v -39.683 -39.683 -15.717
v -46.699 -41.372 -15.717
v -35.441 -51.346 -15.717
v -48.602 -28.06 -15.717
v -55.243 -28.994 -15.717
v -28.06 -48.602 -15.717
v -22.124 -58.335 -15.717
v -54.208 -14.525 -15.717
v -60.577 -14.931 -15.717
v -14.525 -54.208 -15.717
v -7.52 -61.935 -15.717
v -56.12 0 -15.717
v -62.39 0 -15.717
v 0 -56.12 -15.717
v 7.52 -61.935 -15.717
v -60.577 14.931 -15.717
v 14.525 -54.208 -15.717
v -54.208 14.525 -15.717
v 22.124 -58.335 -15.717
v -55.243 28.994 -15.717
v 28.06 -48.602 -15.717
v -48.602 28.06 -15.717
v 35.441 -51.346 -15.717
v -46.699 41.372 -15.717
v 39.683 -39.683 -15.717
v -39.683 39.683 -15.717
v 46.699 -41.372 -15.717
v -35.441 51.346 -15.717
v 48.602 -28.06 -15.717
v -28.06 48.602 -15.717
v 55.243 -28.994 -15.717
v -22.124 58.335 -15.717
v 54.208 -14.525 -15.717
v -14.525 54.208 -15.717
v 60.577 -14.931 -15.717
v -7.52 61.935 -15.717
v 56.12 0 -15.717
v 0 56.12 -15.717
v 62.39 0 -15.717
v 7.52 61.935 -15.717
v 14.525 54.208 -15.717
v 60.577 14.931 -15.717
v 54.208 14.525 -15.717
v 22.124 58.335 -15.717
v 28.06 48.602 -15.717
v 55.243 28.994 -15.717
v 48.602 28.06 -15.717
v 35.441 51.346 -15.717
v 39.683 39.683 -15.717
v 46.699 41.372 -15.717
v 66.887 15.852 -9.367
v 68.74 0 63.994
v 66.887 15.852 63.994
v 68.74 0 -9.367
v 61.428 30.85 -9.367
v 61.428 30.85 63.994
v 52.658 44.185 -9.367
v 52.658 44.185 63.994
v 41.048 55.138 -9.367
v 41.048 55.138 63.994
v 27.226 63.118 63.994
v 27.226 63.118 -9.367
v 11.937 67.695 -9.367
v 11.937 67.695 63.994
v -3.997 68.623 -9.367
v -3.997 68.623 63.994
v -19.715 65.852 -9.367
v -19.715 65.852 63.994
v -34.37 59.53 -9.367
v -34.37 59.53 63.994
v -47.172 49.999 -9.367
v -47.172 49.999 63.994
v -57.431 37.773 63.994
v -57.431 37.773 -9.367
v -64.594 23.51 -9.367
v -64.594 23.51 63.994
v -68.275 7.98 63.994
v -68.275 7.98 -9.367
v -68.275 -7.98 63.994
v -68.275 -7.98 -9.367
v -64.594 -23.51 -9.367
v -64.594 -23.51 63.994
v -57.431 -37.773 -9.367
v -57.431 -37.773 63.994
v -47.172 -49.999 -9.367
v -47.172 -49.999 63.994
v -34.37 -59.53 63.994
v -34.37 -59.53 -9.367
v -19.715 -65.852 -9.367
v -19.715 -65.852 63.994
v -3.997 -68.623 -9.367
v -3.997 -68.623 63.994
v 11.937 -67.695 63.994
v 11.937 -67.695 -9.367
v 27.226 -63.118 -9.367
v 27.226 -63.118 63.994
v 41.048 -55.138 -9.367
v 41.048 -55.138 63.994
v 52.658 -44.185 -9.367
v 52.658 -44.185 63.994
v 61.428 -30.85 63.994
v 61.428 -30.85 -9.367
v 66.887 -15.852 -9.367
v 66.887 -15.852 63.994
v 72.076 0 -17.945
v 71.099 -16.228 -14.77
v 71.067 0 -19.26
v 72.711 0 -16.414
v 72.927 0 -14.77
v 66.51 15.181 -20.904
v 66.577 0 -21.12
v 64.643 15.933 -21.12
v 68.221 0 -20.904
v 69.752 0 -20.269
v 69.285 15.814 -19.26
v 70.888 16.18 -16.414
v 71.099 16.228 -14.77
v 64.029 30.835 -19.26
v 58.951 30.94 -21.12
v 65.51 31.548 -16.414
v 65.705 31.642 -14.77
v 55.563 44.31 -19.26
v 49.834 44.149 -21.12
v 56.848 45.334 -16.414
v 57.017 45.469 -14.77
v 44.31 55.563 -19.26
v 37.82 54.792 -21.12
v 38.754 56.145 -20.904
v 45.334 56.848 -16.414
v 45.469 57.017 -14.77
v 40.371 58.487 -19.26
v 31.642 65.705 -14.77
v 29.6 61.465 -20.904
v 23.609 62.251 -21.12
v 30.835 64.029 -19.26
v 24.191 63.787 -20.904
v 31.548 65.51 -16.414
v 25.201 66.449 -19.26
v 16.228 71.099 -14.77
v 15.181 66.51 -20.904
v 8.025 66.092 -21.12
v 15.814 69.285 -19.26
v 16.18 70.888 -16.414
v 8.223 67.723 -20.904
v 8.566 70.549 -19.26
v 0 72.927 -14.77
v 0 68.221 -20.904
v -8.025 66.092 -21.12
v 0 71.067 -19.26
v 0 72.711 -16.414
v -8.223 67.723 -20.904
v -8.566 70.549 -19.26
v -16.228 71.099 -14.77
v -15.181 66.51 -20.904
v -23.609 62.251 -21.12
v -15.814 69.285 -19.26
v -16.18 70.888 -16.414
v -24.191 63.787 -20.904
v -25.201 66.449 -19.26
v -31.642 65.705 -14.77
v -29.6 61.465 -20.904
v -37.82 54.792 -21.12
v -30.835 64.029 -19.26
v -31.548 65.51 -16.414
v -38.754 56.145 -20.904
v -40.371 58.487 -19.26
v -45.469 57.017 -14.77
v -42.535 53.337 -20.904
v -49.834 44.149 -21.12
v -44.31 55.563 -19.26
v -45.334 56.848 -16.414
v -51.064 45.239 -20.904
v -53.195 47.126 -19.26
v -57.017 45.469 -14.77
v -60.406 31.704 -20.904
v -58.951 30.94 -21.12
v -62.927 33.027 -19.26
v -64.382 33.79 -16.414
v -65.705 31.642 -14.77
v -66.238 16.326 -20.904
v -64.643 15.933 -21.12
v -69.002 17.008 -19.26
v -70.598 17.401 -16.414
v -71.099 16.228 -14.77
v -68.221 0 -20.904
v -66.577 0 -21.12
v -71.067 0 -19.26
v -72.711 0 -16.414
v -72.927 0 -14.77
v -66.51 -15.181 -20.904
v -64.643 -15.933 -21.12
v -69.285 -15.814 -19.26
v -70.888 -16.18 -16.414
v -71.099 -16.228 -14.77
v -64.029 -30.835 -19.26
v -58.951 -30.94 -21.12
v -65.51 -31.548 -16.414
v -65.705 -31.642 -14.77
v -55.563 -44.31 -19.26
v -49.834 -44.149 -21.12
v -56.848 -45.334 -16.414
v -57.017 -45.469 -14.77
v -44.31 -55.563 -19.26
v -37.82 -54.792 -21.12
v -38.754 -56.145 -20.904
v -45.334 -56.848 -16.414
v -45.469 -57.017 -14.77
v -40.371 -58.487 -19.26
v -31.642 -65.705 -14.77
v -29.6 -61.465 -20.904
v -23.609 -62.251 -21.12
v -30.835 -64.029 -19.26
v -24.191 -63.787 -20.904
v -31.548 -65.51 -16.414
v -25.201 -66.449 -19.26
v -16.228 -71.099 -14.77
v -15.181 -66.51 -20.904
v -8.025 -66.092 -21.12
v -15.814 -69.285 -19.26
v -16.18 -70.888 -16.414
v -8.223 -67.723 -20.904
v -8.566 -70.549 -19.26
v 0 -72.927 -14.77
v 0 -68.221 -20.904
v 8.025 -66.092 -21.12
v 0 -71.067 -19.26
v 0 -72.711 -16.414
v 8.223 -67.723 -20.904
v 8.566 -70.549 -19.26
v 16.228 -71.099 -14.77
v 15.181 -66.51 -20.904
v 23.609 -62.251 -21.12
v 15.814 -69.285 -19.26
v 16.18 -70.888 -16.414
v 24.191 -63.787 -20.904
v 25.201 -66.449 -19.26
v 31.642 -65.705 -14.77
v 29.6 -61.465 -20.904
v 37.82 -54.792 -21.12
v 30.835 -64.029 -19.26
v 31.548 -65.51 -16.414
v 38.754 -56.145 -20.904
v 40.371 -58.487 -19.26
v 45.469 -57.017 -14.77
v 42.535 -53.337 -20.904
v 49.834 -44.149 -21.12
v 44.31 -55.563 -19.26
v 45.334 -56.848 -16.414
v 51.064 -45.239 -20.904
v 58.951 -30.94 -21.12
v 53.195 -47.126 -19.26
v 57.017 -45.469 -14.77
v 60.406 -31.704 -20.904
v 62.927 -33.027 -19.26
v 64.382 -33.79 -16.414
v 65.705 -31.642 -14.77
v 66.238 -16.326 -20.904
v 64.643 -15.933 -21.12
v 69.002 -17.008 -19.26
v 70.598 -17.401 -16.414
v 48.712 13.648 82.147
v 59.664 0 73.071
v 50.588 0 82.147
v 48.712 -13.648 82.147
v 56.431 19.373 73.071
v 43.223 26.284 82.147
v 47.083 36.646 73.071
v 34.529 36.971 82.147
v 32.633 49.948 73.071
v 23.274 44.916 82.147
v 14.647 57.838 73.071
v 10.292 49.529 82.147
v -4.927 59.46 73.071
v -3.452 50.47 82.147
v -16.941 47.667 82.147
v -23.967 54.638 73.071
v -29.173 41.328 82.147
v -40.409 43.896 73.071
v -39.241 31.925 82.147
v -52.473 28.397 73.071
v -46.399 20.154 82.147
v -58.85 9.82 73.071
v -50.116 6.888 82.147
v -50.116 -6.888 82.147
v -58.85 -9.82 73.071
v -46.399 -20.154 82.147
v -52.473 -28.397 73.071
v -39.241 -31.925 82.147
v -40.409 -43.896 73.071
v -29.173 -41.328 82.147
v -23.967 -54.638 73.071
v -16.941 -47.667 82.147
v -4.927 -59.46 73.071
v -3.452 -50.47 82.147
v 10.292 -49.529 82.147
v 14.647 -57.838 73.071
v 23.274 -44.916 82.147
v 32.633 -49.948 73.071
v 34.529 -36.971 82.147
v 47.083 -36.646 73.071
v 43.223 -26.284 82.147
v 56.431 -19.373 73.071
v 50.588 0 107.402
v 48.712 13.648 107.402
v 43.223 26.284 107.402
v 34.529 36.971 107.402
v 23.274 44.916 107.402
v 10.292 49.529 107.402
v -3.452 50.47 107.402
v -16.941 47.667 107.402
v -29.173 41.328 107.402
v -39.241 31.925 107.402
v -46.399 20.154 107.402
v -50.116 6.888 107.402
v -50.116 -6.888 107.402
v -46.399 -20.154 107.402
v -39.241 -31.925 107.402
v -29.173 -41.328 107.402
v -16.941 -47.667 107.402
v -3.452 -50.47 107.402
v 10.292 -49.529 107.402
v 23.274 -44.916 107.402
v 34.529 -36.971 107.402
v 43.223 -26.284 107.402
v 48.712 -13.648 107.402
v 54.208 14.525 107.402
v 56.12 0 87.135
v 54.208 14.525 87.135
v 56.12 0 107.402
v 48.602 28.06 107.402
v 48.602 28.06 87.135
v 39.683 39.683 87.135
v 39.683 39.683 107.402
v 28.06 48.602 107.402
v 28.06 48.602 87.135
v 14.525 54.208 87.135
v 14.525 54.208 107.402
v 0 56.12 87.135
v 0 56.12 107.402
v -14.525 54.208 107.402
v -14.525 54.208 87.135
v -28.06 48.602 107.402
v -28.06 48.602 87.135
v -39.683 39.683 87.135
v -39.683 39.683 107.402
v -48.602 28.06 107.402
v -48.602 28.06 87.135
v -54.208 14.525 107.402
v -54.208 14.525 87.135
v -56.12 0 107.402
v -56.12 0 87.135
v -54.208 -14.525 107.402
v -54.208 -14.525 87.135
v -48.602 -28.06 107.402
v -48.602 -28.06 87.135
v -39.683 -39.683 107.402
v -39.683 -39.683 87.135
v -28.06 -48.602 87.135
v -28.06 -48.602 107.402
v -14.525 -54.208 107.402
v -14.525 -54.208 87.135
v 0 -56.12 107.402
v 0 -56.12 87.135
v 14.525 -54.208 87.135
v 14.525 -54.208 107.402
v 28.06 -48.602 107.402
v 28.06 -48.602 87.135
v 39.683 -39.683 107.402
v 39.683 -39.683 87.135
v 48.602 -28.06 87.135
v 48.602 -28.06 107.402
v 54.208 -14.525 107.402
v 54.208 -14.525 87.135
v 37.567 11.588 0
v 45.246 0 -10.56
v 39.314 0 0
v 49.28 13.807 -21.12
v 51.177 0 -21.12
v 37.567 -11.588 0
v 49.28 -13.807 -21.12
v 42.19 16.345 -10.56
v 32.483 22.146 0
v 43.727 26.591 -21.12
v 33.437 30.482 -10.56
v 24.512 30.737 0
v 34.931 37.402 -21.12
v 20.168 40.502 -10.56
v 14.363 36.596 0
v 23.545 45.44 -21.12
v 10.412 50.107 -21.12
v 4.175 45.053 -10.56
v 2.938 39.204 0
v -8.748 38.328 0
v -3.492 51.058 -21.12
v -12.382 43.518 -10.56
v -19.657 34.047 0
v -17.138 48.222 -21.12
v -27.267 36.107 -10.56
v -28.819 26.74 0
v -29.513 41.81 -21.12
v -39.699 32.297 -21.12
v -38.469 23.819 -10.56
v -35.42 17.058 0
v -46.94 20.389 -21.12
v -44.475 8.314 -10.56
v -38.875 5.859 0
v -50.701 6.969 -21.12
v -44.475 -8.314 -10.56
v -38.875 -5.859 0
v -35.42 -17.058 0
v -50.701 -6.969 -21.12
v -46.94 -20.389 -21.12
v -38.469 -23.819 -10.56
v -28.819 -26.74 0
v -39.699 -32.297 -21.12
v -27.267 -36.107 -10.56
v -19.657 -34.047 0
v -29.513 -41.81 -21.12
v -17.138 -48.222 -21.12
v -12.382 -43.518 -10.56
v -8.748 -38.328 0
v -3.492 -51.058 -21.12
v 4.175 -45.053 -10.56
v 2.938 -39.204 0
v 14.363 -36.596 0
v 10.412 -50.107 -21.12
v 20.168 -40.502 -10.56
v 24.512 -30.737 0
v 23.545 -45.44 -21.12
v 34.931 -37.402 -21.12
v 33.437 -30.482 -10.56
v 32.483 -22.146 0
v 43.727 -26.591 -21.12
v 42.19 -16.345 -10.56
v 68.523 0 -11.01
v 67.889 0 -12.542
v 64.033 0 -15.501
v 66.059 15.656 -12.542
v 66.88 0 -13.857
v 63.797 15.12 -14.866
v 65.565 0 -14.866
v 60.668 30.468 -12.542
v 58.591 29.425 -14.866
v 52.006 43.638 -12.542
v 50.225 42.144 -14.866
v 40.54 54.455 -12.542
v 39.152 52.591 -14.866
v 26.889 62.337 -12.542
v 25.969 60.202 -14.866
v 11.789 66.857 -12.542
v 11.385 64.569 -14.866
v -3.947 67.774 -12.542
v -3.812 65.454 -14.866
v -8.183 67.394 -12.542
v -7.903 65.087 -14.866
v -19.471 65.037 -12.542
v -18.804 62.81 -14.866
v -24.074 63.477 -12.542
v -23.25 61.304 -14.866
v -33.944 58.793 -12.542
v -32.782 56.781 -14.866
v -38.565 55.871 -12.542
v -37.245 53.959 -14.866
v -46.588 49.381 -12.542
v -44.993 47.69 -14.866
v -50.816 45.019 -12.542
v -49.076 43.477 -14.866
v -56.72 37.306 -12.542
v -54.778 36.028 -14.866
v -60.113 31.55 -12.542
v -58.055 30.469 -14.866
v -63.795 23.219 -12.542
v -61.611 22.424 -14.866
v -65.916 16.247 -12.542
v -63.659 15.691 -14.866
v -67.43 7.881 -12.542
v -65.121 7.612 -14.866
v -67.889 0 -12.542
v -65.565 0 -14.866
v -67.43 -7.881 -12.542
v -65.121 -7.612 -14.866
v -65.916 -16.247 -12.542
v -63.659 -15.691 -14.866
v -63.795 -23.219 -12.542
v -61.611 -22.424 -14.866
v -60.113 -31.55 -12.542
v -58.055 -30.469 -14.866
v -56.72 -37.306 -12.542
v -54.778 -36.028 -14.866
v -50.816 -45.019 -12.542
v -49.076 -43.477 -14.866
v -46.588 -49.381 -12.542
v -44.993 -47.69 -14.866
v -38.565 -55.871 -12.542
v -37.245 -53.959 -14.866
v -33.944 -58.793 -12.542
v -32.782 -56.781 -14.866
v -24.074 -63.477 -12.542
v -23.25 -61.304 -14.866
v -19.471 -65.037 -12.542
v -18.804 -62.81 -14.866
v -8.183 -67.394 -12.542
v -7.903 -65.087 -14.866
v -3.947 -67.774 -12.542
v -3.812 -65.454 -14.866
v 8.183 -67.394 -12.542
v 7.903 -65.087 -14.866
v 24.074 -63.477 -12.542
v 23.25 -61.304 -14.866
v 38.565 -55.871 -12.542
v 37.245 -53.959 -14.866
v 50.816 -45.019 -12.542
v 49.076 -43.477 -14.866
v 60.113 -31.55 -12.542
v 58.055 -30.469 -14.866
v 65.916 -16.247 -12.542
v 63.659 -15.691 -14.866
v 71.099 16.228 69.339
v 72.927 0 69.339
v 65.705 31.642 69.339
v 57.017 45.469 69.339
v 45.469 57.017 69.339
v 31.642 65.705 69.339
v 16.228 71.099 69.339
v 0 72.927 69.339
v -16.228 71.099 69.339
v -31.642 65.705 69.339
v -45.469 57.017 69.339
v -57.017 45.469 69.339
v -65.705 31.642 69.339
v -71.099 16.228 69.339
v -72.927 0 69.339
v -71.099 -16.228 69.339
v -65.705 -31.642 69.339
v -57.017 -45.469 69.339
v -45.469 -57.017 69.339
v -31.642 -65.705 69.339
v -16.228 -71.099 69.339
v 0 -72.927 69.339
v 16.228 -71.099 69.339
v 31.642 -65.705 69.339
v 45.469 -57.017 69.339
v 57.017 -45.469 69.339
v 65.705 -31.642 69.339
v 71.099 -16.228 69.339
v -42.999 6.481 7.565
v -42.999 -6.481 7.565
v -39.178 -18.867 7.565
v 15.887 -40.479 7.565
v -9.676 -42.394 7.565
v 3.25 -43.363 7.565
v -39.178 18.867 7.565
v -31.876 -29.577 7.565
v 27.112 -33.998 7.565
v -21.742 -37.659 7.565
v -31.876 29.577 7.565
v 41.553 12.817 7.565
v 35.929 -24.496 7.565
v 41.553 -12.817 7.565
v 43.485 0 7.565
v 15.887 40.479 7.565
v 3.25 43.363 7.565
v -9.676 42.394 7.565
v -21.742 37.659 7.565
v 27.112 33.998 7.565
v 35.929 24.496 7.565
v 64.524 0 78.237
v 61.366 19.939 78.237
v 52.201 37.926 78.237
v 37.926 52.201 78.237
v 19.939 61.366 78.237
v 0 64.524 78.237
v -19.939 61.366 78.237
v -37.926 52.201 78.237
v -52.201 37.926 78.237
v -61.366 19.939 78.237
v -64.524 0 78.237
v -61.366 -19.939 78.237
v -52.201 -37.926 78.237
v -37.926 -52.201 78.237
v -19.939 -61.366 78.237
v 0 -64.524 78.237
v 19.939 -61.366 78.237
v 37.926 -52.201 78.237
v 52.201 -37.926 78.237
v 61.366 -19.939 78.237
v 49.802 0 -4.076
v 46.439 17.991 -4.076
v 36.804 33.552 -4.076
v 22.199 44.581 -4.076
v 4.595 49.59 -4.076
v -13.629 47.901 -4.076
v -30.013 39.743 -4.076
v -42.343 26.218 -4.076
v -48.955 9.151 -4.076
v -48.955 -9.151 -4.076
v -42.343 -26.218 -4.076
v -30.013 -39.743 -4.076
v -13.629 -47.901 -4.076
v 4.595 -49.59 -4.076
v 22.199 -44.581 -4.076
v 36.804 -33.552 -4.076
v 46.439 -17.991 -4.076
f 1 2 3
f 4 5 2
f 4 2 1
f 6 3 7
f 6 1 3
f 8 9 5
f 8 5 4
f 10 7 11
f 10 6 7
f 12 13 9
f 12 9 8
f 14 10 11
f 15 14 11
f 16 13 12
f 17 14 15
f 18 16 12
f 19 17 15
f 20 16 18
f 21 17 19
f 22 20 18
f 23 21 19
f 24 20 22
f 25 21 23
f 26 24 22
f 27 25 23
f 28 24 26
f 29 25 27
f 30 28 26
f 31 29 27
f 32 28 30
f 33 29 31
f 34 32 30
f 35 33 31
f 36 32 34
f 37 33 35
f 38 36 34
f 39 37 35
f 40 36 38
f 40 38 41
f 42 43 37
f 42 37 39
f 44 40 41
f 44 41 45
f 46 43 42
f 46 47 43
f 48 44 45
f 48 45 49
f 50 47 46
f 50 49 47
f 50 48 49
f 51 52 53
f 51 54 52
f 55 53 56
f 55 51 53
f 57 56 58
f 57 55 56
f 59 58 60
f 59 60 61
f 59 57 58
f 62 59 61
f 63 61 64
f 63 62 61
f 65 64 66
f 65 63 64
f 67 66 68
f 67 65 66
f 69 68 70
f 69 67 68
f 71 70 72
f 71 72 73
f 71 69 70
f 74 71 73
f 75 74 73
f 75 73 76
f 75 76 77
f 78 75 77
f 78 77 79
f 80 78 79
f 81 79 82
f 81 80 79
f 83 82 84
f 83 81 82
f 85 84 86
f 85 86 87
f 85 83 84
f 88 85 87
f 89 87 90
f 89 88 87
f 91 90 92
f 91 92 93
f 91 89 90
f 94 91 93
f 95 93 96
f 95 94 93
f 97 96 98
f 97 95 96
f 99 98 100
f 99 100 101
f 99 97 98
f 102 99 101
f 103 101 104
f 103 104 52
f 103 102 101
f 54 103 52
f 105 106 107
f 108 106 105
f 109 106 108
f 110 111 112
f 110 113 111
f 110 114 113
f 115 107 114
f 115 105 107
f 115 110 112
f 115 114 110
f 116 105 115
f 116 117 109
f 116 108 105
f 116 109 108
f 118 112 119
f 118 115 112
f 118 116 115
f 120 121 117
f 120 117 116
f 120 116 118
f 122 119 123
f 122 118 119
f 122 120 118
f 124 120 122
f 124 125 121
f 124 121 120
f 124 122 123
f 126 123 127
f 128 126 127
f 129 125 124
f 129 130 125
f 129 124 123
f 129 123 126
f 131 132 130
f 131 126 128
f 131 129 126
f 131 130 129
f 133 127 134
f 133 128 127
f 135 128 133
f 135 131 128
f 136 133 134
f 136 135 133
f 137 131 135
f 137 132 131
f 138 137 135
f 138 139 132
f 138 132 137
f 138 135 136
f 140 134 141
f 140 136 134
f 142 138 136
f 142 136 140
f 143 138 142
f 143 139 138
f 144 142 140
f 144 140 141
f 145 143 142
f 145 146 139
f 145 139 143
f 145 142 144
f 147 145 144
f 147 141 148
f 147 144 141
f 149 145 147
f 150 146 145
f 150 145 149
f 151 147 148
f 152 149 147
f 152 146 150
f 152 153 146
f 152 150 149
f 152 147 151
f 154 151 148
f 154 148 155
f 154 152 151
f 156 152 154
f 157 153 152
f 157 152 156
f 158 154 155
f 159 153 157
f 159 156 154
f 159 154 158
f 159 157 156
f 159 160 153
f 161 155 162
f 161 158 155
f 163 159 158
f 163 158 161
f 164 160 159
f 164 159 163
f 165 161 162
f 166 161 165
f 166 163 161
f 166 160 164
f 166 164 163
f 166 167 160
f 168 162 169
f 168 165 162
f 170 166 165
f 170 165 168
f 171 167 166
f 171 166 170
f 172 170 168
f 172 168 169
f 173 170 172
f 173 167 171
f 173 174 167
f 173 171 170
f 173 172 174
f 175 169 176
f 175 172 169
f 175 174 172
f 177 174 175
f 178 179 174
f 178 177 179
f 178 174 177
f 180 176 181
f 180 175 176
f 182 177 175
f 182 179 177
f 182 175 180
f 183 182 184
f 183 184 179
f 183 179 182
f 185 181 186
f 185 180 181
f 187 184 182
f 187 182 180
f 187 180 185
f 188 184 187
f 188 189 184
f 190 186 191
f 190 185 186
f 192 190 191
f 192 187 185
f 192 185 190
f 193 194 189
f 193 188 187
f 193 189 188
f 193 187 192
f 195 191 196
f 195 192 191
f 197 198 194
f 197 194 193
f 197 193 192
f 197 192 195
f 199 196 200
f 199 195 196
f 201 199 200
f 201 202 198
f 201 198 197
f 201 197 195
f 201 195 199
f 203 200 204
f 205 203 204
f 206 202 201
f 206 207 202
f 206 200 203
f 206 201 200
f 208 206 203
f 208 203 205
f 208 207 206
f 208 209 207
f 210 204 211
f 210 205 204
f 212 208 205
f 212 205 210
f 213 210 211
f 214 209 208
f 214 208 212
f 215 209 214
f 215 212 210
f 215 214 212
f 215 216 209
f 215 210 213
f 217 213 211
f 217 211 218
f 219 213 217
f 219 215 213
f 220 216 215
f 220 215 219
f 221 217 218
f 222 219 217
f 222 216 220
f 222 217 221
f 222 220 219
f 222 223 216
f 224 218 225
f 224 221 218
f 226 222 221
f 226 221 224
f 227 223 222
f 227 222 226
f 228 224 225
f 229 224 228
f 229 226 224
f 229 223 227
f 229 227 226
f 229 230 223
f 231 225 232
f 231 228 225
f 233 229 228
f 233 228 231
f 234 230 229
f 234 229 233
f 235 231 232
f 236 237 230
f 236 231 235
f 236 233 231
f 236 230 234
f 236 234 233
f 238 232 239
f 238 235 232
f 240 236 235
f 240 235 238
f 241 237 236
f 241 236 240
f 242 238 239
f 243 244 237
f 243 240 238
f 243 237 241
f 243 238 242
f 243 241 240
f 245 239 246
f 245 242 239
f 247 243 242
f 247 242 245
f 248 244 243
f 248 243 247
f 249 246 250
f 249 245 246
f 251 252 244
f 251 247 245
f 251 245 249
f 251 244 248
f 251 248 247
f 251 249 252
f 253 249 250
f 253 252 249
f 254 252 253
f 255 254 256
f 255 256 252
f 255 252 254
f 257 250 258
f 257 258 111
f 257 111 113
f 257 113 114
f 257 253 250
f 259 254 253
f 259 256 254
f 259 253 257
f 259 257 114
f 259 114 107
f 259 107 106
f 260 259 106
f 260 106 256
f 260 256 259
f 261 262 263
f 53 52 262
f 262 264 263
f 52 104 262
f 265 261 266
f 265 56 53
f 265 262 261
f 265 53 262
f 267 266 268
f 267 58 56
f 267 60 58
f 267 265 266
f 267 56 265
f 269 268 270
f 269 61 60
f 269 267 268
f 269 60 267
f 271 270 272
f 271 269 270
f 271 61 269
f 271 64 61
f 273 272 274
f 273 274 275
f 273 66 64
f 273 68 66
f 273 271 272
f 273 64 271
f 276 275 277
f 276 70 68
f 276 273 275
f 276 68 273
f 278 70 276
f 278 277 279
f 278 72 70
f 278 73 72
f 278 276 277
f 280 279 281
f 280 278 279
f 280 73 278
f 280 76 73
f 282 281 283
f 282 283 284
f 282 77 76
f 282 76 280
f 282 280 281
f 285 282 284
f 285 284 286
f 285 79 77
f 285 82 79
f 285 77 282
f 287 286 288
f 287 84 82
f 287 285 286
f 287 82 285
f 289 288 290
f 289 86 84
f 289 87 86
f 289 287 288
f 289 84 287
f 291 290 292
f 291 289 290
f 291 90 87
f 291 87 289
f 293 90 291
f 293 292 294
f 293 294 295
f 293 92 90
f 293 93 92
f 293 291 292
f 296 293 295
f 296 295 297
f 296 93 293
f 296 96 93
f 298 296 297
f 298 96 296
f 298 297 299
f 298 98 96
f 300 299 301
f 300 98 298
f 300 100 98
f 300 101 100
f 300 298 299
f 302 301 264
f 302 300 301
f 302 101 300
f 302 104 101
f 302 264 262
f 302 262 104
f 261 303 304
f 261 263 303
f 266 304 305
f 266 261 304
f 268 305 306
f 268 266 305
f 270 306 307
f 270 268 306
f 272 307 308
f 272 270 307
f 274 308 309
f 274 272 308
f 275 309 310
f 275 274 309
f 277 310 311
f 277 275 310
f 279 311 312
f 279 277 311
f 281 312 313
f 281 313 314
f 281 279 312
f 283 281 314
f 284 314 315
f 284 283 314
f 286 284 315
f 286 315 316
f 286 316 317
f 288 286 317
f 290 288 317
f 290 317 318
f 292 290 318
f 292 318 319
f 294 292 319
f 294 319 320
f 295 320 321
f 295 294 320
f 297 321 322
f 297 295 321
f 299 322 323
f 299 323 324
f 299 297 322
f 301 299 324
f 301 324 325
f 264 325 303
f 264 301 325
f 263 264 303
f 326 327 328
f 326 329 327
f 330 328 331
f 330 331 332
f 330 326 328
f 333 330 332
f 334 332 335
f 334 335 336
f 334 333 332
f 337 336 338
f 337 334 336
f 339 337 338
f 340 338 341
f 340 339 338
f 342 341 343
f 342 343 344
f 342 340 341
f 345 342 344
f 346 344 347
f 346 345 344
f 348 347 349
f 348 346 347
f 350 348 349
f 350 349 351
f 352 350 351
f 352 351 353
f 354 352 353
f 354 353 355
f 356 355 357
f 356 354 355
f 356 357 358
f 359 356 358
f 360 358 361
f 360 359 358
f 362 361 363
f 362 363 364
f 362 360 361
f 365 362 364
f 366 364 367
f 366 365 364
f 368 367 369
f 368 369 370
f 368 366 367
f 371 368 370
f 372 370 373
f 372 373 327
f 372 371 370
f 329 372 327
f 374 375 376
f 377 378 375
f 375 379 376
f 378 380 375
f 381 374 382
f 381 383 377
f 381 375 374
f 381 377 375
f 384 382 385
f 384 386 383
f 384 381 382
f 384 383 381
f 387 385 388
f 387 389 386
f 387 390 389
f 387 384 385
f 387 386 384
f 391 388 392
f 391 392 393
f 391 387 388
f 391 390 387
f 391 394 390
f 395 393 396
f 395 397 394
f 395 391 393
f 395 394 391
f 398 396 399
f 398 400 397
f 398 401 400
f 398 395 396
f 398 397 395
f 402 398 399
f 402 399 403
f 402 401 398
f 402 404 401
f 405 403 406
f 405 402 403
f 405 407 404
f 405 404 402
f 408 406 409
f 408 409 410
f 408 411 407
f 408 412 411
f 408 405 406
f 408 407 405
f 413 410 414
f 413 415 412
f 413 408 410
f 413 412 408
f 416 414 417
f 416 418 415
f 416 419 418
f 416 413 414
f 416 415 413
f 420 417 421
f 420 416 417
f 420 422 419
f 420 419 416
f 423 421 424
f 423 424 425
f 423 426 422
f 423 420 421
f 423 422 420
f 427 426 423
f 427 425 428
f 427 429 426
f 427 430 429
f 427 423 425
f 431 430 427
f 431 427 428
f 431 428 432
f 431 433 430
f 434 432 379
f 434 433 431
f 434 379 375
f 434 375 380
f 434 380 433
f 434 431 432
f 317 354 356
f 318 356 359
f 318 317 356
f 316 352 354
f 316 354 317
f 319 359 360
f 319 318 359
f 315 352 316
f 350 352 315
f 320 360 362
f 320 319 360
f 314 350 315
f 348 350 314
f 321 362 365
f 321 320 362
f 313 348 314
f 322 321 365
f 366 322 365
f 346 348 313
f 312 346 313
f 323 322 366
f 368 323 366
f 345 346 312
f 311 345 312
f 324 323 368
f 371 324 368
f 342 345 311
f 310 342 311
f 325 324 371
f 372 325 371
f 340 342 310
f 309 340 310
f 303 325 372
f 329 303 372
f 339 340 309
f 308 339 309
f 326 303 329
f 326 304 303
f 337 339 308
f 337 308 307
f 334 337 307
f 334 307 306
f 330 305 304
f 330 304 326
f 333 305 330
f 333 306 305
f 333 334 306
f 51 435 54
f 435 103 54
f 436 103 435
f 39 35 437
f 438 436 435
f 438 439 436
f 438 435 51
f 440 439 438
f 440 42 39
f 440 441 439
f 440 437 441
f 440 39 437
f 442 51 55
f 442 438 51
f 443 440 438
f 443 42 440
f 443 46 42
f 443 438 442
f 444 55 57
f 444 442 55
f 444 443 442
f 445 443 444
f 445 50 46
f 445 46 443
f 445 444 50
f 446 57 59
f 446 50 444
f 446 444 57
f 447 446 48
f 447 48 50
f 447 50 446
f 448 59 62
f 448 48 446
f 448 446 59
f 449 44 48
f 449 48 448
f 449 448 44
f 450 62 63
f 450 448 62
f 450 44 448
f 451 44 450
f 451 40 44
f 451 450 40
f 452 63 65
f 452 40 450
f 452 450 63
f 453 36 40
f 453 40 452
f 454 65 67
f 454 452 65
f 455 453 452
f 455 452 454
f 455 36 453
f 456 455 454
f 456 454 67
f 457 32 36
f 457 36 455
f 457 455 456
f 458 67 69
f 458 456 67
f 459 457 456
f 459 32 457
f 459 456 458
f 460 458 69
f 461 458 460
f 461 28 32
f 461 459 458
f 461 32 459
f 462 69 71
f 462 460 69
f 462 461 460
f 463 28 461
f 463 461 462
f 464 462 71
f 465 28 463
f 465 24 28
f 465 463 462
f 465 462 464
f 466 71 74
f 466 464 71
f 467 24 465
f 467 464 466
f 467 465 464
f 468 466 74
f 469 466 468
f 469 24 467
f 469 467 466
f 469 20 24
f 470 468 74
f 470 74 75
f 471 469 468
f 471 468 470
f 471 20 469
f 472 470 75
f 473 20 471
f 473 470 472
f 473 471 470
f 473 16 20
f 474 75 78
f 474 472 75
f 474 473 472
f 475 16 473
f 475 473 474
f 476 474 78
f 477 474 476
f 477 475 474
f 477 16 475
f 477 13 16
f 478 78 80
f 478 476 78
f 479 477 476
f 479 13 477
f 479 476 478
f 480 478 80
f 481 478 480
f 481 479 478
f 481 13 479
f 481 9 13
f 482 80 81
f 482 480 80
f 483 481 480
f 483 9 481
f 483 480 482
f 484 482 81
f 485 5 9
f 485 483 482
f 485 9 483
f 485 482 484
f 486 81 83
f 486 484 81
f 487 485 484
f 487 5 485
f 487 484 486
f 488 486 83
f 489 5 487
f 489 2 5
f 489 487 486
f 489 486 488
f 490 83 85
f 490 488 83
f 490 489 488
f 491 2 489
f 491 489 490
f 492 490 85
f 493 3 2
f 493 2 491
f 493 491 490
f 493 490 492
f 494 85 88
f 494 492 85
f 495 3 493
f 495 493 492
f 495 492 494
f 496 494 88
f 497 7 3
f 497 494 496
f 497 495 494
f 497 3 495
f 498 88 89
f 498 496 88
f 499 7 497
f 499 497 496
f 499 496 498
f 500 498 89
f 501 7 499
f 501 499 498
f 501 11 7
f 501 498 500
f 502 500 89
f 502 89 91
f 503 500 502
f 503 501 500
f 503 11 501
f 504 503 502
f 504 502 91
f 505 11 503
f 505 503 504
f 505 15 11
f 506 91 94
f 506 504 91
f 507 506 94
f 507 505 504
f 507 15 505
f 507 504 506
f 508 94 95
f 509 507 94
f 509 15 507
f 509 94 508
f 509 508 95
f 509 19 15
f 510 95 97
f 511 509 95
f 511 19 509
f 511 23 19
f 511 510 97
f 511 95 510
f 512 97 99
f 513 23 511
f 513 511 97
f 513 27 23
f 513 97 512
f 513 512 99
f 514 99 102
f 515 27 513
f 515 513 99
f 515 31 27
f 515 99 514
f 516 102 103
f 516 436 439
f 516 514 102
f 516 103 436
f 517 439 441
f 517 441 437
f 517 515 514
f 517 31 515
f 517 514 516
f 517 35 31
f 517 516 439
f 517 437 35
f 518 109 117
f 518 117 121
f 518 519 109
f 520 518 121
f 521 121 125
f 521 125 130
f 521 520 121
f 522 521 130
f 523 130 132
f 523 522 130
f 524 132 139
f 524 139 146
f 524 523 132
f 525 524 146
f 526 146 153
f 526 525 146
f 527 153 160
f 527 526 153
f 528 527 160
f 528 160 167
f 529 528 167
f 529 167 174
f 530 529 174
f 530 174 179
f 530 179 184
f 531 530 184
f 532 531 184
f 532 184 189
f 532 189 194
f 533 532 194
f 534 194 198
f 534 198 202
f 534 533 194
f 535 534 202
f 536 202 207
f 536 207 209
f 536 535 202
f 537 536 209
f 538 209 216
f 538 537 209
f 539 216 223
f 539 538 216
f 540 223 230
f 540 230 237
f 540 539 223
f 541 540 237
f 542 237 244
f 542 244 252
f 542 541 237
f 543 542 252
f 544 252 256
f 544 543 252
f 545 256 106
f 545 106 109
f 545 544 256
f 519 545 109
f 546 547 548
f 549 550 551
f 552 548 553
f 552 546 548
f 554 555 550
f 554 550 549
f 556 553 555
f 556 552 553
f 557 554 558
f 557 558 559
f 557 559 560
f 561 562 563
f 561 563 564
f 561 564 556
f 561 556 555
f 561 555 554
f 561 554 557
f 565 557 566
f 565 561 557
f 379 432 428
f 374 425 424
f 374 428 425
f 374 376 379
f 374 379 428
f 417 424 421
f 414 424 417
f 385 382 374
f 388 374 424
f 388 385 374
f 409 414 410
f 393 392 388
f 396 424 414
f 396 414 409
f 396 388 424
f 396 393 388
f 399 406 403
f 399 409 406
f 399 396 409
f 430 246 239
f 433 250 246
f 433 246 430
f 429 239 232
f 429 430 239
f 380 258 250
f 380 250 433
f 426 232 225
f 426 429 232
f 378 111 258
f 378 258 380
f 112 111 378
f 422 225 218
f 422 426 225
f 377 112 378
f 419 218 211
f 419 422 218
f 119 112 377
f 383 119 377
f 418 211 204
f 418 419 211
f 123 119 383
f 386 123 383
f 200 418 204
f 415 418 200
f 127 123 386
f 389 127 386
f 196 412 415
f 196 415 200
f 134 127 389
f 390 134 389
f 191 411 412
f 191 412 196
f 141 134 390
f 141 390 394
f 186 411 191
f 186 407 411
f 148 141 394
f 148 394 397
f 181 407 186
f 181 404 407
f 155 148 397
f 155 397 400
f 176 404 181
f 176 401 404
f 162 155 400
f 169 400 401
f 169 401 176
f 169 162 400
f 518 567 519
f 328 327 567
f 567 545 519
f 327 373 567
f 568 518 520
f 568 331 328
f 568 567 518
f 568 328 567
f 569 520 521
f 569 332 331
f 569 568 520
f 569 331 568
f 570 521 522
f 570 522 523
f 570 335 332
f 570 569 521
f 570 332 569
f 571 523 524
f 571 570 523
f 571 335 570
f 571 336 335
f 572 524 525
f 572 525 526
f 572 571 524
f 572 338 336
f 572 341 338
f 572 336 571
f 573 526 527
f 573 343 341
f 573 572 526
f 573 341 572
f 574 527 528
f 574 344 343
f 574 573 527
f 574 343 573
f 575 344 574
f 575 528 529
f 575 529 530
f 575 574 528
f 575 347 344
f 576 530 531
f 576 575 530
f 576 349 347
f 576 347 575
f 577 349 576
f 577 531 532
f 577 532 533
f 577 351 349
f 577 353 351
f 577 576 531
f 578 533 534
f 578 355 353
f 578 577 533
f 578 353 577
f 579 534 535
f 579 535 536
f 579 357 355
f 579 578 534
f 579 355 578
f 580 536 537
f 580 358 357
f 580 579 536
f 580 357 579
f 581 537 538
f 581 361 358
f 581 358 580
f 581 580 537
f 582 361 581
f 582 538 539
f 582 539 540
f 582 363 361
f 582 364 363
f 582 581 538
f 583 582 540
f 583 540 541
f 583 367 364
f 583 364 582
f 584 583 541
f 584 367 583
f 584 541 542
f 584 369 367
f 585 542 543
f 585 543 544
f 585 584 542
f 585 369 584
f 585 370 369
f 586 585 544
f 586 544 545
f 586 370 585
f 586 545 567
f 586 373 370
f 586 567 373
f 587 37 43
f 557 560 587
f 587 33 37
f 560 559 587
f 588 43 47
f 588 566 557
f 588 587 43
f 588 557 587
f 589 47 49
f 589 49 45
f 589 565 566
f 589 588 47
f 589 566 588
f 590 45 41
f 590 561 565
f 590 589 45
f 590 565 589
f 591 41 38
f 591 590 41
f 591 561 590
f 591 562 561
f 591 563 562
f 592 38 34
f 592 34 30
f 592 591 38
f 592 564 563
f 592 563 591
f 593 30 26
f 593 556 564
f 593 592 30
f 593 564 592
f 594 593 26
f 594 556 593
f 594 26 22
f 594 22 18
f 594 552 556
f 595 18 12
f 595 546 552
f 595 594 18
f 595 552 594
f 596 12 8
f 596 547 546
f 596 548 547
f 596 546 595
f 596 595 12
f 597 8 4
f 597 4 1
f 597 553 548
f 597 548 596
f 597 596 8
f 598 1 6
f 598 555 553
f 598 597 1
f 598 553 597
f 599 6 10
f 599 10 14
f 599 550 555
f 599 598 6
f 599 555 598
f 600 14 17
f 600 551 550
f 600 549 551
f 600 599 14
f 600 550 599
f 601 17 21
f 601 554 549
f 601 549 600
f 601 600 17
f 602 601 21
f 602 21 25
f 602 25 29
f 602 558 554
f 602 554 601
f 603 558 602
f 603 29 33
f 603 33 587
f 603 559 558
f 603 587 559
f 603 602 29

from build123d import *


with BuildPart() as f1:
    # F0 (on Front) → F1 (revolve)
    with BuildSketch(Plane.XZ):
        with BuildLine():
            Line((0, 7.565121), (0, 0))
            Line((0, 0), (39.313756, 0))
            Line((39.313756, 0), (51.177312, -21.120233))
            Line((51.177312, -21.120233), (66.577177, -21.120233))
            ThreePointArc((66.577177, -21.120233), (71.067305, -19.260362), (72.927177, -14.770233))
            Line((72.927177, -14.770233), (72.927177, 69.339424))
            Line((72.927177, 69.339424), (56.120466, 87.134771))
            Line((56.120466, 87.134771), (56.120466, 107.401684))
            Line((56.120466, 107.401684), (50.587501, 107.401684))
            Line((50.587501, 107.401684), (50.587501, 82.146585))
            Line((50.587501, 82.146585), (68.7396, 63.994482))
            Line((68.7396, 63.994482), (68.7396, -9.366923))
            ThreePointArc((68.7396, -9.366923), (66.879729, -13.857051), (62.3896, -15.716923))
            Line((62.3896, -15.716923), (56.120466, -15.716923))
            Line((56.120466, -15.716923), (43.484502, 7.565121))
            Line((43.484502, 7.565121), (0, 7.565121))
        make_face()
    revolve(axis=Axis((0, 0, 35.899226), (0, 0, 1)))


solid = f1.part
